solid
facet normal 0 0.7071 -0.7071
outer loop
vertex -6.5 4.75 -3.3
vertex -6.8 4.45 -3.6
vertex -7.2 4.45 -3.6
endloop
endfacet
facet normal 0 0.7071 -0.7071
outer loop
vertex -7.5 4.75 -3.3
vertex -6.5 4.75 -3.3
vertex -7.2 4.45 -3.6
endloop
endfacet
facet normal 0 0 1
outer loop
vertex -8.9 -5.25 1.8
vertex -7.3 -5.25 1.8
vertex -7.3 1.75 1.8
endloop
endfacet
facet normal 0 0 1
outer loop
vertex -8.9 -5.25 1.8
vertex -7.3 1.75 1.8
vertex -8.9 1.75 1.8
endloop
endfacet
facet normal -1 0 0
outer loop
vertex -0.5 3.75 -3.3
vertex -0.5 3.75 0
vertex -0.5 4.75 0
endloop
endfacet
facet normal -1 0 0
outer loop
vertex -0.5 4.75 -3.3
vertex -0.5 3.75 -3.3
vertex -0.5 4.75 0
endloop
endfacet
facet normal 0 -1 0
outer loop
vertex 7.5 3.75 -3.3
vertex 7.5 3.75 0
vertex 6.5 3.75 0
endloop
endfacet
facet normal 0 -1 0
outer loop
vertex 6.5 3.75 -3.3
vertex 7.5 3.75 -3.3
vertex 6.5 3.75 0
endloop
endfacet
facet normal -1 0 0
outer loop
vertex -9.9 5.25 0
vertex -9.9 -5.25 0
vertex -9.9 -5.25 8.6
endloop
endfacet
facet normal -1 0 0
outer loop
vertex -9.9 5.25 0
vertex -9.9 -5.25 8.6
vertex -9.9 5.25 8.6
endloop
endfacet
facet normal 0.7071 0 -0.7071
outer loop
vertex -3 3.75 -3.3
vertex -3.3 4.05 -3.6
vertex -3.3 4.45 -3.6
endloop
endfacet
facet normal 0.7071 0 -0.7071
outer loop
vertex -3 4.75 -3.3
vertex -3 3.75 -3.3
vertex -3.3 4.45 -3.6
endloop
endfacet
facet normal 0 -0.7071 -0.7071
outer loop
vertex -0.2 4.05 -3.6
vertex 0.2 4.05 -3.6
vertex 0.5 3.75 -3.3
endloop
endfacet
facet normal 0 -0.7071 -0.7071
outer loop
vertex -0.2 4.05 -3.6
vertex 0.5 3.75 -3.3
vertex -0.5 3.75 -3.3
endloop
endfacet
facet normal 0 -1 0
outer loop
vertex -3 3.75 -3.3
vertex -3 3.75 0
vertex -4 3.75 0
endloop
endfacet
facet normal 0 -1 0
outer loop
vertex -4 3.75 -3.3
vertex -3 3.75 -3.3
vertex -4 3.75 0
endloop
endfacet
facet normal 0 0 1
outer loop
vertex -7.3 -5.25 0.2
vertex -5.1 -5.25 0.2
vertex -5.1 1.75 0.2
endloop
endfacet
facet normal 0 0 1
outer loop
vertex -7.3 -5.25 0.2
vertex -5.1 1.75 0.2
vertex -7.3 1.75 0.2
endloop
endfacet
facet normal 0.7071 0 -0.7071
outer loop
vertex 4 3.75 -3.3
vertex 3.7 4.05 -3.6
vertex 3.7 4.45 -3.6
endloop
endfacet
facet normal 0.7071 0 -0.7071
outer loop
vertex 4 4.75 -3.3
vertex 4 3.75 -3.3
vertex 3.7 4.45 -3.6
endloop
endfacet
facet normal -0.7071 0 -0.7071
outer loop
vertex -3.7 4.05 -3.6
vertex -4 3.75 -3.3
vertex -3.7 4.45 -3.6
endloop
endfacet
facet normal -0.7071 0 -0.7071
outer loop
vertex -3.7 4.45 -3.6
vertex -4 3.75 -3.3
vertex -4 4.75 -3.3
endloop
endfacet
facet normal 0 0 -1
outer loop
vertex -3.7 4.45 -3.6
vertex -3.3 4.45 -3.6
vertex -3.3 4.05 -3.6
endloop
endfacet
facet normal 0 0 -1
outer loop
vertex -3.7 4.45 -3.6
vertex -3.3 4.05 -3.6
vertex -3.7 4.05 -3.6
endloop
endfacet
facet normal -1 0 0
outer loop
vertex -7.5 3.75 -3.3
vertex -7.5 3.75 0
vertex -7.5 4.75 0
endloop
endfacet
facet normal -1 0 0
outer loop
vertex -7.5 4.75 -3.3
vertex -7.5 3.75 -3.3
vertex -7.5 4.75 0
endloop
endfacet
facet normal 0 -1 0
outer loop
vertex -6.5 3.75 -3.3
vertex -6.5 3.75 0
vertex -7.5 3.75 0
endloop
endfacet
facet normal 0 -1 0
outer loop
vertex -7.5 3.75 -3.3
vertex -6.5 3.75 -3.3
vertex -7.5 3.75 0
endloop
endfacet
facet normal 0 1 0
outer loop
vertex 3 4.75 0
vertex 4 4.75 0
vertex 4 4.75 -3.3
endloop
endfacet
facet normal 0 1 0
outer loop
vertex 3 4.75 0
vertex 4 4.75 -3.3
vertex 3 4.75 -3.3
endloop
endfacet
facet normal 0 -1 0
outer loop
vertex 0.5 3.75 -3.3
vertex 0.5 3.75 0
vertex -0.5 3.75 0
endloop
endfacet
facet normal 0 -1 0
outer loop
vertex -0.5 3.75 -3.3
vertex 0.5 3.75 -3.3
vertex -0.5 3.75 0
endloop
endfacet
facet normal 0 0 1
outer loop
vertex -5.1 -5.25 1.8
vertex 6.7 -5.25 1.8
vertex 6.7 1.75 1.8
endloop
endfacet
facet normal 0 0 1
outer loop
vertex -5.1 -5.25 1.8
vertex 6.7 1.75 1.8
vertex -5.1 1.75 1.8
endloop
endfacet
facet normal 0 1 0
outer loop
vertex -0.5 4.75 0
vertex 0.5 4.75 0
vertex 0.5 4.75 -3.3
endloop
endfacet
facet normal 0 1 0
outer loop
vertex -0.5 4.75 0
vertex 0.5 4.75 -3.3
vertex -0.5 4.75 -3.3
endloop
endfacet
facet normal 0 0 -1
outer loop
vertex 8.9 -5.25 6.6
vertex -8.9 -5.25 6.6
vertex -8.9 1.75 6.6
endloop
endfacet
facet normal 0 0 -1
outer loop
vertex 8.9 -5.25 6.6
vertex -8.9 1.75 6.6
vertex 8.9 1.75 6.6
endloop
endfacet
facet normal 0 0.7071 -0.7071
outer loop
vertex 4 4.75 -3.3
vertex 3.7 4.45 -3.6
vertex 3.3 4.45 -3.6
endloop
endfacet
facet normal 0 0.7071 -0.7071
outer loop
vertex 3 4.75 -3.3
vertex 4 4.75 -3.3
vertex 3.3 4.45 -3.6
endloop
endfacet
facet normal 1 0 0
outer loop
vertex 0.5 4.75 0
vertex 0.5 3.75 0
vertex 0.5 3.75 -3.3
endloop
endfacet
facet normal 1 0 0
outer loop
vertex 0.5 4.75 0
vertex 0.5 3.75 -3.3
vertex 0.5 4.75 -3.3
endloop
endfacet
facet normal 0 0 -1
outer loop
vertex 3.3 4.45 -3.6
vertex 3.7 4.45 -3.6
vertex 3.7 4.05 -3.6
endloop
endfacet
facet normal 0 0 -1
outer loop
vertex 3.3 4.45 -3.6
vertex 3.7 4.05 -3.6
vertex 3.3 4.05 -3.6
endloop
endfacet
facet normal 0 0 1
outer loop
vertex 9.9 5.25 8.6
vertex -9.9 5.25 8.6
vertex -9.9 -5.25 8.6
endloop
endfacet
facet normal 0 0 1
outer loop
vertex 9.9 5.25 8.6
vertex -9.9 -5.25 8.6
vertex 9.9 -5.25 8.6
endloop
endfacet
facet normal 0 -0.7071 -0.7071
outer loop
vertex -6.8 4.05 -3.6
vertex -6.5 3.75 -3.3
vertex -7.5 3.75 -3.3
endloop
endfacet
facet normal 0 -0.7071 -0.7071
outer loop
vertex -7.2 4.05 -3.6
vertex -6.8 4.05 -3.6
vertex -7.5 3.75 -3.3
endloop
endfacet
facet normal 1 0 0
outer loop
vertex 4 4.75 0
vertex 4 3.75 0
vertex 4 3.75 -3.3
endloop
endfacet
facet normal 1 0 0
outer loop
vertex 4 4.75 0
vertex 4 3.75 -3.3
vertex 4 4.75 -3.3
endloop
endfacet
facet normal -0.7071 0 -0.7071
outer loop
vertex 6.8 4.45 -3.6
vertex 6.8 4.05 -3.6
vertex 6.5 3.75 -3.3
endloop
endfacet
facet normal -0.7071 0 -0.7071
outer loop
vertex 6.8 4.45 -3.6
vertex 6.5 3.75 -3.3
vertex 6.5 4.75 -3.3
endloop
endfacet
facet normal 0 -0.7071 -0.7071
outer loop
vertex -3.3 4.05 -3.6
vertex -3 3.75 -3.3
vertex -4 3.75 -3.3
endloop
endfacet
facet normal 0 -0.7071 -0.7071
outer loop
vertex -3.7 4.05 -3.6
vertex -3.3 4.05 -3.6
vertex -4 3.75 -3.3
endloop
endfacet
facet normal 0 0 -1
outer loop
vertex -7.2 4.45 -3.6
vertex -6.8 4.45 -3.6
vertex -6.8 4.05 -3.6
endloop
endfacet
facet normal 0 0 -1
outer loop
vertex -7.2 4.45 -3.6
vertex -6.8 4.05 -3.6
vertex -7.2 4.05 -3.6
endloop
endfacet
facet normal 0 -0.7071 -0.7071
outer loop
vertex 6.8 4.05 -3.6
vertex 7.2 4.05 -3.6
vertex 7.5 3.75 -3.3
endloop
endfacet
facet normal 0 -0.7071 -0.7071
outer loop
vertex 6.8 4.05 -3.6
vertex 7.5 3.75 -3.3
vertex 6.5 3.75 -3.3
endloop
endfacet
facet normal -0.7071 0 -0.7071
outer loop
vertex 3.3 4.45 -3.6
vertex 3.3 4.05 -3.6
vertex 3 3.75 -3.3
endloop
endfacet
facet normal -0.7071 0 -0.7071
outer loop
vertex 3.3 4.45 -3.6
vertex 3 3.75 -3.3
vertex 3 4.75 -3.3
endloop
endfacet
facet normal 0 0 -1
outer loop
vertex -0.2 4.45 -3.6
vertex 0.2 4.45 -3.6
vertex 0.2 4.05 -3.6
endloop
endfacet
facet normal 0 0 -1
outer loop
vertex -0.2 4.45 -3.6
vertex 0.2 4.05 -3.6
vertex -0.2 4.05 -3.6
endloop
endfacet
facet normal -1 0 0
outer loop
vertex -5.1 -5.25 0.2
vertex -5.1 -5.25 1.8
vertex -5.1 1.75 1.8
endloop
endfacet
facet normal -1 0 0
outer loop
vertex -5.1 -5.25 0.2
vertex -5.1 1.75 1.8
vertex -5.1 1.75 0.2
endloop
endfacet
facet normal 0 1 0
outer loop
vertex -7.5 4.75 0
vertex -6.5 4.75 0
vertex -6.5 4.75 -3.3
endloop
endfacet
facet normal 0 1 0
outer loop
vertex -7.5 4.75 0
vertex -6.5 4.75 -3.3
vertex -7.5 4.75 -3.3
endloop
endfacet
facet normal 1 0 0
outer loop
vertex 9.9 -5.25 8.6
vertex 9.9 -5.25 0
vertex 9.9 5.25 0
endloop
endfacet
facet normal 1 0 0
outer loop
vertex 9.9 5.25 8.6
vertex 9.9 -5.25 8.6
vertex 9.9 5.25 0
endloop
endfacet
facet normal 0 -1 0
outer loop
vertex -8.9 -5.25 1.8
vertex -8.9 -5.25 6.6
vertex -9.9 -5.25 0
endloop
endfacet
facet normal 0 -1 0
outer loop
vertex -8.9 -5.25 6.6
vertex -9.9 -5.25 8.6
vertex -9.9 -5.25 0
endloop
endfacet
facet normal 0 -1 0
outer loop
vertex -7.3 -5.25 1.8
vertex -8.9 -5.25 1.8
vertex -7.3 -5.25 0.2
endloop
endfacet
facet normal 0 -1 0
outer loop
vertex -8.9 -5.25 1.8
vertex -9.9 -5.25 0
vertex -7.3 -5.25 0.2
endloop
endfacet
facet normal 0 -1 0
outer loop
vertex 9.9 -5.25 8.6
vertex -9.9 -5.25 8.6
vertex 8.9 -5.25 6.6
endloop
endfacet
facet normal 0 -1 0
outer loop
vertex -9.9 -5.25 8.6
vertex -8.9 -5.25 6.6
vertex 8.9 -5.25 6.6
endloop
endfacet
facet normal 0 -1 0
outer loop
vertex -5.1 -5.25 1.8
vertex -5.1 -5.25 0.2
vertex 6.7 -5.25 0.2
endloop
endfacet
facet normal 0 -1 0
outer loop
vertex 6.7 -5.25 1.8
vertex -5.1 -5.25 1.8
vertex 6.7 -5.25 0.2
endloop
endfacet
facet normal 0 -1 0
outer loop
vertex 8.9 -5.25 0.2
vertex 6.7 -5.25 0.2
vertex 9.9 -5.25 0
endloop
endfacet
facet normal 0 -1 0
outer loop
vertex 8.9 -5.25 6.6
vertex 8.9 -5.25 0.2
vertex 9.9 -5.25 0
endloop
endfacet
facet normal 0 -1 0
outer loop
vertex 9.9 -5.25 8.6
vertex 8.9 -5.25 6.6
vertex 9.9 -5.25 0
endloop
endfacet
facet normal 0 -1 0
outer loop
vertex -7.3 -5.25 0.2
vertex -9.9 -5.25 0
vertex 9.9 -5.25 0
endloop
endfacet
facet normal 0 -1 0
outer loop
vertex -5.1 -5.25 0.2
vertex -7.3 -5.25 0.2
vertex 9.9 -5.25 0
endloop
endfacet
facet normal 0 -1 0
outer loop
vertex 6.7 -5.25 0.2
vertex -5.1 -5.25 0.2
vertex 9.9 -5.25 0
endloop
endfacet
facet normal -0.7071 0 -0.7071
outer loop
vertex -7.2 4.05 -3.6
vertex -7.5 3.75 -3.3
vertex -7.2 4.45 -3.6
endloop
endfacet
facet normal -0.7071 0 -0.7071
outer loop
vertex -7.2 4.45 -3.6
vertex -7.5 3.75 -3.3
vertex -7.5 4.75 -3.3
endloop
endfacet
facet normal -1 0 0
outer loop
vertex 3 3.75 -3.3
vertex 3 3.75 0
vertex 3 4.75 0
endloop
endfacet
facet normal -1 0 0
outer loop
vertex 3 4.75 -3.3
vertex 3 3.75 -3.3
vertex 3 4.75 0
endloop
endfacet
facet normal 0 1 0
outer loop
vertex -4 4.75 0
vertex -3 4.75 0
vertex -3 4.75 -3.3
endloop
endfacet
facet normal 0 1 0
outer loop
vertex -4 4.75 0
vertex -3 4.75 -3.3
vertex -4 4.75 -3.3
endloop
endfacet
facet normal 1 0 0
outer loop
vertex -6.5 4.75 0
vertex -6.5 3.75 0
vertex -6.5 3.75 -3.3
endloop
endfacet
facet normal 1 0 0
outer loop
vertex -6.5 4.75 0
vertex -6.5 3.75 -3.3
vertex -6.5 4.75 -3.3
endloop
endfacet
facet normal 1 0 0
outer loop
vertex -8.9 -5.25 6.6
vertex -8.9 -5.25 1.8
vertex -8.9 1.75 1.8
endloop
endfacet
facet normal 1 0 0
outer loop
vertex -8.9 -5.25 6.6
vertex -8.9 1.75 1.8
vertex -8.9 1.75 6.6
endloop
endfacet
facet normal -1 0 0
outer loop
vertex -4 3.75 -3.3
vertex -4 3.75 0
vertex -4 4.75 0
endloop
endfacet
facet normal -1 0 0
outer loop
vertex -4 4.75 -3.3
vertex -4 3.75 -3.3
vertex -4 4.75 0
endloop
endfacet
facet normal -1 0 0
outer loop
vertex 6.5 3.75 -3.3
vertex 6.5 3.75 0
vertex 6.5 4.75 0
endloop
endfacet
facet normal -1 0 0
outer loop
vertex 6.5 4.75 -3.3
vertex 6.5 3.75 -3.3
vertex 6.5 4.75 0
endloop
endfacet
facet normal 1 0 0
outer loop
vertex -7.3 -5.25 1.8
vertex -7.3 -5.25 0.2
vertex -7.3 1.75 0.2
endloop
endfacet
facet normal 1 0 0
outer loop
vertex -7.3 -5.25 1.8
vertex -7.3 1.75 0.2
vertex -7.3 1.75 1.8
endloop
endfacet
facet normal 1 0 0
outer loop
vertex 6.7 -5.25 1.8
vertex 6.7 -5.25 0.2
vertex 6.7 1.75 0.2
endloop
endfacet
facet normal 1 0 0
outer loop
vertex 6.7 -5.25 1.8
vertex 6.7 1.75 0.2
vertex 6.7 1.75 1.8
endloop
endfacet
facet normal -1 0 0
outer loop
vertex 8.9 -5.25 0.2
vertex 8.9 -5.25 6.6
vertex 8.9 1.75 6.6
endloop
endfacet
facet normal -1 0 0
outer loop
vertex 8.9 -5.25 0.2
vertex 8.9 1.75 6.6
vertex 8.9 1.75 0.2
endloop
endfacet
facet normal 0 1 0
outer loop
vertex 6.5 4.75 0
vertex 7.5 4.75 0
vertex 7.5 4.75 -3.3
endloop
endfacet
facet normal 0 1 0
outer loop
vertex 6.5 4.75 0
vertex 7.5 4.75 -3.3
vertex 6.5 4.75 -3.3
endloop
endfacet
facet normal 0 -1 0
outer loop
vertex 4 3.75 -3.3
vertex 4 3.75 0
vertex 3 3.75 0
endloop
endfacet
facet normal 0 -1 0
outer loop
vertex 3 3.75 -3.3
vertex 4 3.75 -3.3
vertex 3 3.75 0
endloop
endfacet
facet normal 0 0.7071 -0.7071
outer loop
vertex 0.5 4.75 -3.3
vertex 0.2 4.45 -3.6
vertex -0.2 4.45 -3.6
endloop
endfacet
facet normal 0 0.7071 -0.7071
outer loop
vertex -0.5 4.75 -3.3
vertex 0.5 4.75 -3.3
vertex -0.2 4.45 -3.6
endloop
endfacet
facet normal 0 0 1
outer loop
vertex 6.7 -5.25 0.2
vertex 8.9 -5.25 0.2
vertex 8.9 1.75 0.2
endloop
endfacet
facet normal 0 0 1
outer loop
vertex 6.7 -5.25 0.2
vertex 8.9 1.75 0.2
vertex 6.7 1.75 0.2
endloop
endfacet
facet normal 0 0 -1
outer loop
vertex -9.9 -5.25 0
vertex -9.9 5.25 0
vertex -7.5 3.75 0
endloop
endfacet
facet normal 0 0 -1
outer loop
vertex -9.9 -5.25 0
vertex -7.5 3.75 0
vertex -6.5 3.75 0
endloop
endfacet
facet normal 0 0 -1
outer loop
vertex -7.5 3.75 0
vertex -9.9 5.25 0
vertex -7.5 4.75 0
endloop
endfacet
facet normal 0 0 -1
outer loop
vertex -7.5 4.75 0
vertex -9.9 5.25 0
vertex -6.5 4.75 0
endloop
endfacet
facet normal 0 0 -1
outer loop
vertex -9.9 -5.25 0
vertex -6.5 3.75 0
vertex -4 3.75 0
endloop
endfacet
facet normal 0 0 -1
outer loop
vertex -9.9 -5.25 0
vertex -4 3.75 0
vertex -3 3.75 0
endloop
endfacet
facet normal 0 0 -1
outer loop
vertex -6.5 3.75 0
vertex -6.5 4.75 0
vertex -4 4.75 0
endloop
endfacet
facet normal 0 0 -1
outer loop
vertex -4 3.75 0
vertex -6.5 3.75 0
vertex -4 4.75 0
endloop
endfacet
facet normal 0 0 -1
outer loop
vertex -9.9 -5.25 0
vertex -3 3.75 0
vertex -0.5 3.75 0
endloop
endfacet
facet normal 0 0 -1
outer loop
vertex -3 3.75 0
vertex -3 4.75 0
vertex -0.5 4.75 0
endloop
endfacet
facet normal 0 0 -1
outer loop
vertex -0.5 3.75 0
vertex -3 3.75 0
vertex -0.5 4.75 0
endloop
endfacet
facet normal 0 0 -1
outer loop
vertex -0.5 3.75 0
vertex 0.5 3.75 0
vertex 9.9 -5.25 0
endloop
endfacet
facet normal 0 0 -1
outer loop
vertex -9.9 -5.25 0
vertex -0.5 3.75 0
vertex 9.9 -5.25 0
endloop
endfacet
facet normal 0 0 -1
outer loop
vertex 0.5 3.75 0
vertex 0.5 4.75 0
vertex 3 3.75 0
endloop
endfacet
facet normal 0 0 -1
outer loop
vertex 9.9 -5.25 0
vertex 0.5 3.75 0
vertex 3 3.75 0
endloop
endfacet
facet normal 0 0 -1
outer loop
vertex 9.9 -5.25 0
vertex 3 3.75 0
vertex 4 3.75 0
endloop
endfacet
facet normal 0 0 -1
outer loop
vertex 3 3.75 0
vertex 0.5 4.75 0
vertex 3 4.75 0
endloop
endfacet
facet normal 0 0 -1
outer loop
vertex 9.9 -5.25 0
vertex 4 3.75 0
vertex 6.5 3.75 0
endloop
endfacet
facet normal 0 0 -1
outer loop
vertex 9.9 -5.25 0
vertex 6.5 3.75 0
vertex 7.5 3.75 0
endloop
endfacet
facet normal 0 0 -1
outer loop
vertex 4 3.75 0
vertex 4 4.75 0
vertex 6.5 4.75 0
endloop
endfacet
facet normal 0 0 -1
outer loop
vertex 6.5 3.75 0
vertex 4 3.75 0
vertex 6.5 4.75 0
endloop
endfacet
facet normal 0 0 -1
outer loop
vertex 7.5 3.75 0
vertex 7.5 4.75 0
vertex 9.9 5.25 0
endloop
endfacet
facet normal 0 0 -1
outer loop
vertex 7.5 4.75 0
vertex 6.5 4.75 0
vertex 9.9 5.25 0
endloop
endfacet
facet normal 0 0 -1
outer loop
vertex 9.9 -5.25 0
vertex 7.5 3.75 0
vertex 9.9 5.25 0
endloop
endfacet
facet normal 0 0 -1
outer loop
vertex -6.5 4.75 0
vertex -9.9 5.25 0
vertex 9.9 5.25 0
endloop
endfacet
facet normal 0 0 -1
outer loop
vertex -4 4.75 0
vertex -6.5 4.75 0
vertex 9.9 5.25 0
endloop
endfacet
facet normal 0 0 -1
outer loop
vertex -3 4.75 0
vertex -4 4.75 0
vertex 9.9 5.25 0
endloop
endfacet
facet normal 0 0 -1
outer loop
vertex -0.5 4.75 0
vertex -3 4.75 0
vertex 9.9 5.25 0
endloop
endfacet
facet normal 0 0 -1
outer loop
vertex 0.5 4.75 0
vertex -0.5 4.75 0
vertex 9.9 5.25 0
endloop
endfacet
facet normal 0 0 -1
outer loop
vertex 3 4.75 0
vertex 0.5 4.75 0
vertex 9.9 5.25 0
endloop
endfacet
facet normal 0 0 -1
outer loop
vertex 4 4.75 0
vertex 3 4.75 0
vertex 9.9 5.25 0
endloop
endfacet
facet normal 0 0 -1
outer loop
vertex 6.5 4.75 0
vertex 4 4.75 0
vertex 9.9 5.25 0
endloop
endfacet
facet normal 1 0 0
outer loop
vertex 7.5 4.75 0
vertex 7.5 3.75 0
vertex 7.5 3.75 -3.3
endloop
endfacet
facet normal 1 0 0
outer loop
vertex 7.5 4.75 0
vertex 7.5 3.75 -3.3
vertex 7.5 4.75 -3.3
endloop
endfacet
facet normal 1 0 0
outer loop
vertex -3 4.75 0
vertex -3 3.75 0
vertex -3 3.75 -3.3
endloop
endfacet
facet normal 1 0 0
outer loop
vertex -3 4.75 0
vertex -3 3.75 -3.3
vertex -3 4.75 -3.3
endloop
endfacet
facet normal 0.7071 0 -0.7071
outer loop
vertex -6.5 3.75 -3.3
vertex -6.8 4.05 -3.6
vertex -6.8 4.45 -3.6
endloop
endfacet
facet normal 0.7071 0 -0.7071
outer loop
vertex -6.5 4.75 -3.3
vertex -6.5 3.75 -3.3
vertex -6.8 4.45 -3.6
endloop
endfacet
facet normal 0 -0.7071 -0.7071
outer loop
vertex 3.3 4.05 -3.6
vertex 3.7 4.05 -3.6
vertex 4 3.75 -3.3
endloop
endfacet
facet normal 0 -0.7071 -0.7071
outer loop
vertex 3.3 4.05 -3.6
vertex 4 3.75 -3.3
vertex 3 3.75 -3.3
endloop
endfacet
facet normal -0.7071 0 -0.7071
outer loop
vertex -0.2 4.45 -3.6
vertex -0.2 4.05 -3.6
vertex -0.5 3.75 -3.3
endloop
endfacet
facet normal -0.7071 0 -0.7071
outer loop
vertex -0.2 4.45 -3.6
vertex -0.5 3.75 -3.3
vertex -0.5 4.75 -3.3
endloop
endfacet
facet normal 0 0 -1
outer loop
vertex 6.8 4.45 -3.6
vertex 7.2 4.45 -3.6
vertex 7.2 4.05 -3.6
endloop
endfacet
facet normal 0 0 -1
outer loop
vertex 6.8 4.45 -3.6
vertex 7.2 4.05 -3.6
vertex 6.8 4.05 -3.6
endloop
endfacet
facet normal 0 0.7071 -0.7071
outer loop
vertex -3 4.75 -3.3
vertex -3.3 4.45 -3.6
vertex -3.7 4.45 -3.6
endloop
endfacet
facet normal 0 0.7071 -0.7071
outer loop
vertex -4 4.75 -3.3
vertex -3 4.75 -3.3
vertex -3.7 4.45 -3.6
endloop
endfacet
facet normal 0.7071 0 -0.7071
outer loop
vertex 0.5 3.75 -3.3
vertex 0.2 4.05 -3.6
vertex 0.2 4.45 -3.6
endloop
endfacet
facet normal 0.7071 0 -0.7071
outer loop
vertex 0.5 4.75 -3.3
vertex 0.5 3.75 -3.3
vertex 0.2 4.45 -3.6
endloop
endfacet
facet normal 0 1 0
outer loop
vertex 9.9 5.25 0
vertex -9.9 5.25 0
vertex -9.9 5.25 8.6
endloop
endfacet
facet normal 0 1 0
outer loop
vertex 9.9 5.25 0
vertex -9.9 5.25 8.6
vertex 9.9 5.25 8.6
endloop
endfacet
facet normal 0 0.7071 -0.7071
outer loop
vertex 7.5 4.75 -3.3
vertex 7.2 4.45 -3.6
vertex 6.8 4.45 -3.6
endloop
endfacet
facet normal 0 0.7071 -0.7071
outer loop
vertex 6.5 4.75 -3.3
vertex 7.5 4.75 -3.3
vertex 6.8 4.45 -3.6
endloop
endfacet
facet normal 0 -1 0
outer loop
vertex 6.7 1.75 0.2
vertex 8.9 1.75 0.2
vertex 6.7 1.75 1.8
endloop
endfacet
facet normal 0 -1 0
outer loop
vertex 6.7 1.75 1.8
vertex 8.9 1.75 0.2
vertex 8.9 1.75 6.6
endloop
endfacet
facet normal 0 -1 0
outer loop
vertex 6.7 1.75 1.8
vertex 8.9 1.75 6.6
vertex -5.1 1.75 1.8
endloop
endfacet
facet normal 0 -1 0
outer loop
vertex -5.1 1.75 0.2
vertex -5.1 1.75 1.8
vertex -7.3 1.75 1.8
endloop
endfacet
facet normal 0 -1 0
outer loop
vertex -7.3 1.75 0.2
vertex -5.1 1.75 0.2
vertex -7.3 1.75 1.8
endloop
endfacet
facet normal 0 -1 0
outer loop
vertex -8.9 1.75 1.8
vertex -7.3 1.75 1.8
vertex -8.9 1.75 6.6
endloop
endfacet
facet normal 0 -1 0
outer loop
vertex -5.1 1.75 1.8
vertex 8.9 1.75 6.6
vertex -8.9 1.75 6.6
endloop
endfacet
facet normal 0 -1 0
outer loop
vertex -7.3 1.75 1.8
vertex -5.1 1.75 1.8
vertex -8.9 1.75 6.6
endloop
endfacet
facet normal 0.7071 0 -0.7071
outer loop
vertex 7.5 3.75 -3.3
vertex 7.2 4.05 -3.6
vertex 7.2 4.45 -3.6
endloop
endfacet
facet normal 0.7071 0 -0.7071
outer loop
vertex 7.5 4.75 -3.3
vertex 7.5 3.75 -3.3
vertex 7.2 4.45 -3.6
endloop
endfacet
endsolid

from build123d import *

# Parameters (mm, degrees)
SKETCH_1_W                         = 19.8
SKETCH_1_H                         = 10.5
EXTRUDE_1_DEPTH                    = 8.6
CUT_EXTRUDE_1_DEPTH                = 7
EXTRUDE_START                      = -5
SKETCH_3_W                         = 1
SKETCH_3_H                         = 1
EXTRUDE_2_DEPTH                    = 8.6
CHAMFER_1_SIZE                     = 0.3
PATTERN_LINEAR_1_COUNT             = 5
PATTERN_LINEAR_1_PITCH             = 3.5
CHAMFER_1_OF_PATTERN_LINEAR_1_SIZE = 0.3


with BuildPart() as part:
    # Эскиз1 → Бобышка-Вытянуть1 (new body)
    with BuildSketch(Plane.XY):
        Rectangle(SKETCH_1_W, SKETCH_1_H)
    extrude(amount=EXTRUDE_1_DEPTH)

    # Эскиз2 → Вырез-Вытянуть1 (cut)
    with BuildSketch(Plane.XZ.offset(5.25)):
        Polygon((-8.9, 6.6), (8.9, 6.6), (8.9, 0.2), (6.7, 0.2), (6.7, 1.8), (-5.1, 1.8), (-5.1, 0.2), (-7.3, 0.2), (-7.3, 1.8), (-8.9, 1.8), align=None)
    extrude(amount=-CUT_EXTRUDE_1_DEPTH, mode=Mode.SUBTRACT)

    # Эскиз3 → Бобышка-Вытянуть2 (add)
    with BuildSketch(Plane(origin=(0, 0, 0), x_dir=(-1, 0, 0), z_dir=(0, 0, -1)).offset(EXTRUDE_START)):
        with Locations((7, 4.25)):
            Rectangle(SKETCH_3_W, SKETCH_3_H)
    extrude_2 = extrude(amount=EXTRUDE_2_DEPTH)

    # Фаска1
    chamfer_1_edges = [part.edges().sort_by_distance(p)[0] for p in [
        (-6.5, 4.25, -3.6),
        (-7, 3.75, -3.6),
        (-7.5, 4.25, -3.6),
        (-7, 4.75, -3.6),
    ]]
    chamfer(chamfer_1_edges, length=CHAMFER_1_SIZE)

    # Линейный массив1: Бобышка-Вытянуть2 ×5
    with Locations(*[(i * PATTERN_LINEAR_1_PITCH, 0, 0) for i in range(1, PATTERN_LINEAR_1_COUNT)]):
        add(extrude_2)

    # Фаска1 of Линейный массив1
    chamfer_1_of_pattern_linear_1_edges = [part.edges().sort_by_distance(p)[0] for p in [
        (-3, 4.25, -3.6),
        (-3.5, 3.75, -3.6),
        (-4, 4.25, -3.6),
        (-3.5, 4.75, -3.6),
        (0.5, 4.25, -3.6),
        (0, 3.75, -3.6),
        (-0.5, 4.25, -3.6),
        (0, 4.75, -3.6),
        (4, 4.25, -3.6),
        (3.5, 3.75, -3.6),
        (3, 4.25, -3.6),
        (3.5, 4.75, -3.6),
        (7.5, 4.25, -3.6),
        (7, 3.75, -3.6),
        (6.5, 4.25, -3.6),
        (7, 4.75, -3.6),
    ]]
    chamfer(chamfer_1_of_pattern_linear_1_edges, length=CHAMFER_1_OF_PATTERN_LINEAR_1_SIZE)


solid = part.part
